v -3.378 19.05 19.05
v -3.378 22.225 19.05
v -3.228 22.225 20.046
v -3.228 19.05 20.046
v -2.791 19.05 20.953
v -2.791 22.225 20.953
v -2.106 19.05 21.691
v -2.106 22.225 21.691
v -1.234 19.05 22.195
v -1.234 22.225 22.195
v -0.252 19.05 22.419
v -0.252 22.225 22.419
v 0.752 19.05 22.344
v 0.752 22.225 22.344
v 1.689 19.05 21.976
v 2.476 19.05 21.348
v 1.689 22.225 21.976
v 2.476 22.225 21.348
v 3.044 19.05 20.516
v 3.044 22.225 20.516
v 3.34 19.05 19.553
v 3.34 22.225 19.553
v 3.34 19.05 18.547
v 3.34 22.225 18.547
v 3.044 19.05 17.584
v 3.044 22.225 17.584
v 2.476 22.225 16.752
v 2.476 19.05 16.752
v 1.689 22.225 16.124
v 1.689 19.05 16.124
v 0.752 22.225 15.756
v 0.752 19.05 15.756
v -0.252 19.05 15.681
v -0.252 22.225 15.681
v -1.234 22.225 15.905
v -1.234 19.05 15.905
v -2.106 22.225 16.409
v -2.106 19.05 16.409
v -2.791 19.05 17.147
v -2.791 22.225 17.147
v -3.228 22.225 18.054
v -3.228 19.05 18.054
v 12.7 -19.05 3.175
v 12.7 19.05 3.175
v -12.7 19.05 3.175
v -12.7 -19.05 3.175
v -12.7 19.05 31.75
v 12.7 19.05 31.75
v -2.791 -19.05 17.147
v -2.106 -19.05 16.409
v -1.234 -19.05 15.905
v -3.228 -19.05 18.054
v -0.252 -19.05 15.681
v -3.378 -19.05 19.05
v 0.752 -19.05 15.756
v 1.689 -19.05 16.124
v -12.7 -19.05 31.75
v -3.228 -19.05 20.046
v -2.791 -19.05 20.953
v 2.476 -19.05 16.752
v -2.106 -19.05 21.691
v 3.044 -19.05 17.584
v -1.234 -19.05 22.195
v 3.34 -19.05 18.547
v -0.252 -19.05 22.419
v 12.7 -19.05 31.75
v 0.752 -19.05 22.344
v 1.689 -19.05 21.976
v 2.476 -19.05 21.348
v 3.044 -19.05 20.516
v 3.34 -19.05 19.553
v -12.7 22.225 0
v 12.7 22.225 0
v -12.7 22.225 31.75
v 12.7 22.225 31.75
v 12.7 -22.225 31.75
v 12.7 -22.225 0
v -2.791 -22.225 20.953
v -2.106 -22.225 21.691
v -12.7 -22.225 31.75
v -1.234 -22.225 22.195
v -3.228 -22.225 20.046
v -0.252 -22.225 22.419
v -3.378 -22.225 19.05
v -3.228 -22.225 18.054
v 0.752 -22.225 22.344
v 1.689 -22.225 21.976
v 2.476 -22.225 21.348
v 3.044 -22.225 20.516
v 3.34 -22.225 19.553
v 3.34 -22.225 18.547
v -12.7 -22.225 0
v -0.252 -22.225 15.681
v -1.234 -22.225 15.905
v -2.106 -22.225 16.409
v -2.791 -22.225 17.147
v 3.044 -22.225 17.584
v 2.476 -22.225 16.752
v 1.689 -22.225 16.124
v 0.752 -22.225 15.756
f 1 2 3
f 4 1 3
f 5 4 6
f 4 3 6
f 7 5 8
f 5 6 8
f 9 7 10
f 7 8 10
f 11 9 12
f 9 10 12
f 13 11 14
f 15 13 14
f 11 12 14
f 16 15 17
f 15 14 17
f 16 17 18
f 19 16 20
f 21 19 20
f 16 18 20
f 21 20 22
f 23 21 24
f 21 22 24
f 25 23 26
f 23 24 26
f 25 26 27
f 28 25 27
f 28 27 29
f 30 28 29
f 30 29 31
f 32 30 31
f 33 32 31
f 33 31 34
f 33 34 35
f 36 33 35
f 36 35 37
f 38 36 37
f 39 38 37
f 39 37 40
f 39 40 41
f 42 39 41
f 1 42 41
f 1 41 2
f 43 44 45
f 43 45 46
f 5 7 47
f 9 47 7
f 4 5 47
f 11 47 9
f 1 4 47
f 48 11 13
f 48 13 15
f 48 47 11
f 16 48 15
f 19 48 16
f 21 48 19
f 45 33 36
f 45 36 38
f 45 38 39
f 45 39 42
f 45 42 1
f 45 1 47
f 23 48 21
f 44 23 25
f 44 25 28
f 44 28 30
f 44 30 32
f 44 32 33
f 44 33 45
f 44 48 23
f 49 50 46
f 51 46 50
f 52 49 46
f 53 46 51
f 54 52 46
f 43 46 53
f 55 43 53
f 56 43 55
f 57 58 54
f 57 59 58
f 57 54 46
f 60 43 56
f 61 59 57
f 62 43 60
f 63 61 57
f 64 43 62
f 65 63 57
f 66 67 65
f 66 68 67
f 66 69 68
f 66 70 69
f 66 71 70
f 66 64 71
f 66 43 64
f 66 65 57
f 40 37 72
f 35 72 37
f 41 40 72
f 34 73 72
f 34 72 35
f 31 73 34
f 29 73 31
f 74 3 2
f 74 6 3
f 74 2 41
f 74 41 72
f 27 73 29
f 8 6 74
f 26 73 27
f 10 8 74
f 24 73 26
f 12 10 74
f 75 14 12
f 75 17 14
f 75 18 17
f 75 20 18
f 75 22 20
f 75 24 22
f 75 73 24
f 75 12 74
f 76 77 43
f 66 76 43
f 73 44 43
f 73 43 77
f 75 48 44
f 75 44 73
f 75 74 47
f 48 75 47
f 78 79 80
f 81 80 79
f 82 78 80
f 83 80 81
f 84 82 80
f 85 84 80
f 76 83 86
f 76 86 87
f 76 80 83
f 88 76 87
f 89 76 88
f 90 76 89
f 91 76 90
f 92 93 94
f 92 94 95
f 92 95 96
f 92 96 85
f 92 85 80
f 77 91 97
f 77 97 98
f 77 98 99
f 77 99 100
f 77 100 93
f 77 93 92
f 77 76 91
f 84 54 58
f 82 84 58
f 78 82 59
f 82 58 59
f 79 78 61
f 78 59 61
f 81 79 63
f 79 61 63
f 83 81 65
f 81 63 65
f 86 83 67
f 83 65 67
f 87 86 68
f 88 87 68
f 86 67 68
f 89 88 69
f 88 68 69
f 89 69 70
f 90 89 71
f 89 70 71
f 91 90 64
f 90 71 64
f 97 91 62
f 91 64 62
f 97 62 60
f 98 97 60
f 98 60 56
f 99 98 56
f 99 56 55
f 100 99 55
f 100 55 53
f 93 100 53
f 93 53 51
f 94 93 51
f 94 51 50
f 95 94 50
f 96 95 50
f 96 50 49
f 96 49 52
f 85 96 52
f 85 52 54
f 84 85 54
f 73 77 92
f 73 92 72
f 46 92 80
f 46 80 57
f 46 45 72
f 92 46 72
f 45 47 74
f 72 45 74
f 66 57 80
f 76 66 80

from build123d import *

# Parameters (mm, degrees)
F1_DEPTH = 12.7
F3_D     = 6.7564


with BuildPart() as f1:
    # F0 (on Right) → F1 (new body, symmetric)
    with BuildSketch(Plane.YZ):
        Polygon((-22.225, 31.75), (-22.225, 0), (0, 0), (0, 3.175), (-19.05, 3.175), (-19.05, 31.75), align=None)
        Polygon((0, 3.175), (0, 0), (22.225, 0), (22.225, 31.75), (19.05, 31.75), (19.05, 3.175), align=None)
    extrude(amount=F1_DEPTH, both=True)

    # F3 (through all)
    with Locations(Plane.XZ.offset(22.225)):
        with Locations((0, 19.05)):
            Hole(F3_D / 2)


solid = f1.part
